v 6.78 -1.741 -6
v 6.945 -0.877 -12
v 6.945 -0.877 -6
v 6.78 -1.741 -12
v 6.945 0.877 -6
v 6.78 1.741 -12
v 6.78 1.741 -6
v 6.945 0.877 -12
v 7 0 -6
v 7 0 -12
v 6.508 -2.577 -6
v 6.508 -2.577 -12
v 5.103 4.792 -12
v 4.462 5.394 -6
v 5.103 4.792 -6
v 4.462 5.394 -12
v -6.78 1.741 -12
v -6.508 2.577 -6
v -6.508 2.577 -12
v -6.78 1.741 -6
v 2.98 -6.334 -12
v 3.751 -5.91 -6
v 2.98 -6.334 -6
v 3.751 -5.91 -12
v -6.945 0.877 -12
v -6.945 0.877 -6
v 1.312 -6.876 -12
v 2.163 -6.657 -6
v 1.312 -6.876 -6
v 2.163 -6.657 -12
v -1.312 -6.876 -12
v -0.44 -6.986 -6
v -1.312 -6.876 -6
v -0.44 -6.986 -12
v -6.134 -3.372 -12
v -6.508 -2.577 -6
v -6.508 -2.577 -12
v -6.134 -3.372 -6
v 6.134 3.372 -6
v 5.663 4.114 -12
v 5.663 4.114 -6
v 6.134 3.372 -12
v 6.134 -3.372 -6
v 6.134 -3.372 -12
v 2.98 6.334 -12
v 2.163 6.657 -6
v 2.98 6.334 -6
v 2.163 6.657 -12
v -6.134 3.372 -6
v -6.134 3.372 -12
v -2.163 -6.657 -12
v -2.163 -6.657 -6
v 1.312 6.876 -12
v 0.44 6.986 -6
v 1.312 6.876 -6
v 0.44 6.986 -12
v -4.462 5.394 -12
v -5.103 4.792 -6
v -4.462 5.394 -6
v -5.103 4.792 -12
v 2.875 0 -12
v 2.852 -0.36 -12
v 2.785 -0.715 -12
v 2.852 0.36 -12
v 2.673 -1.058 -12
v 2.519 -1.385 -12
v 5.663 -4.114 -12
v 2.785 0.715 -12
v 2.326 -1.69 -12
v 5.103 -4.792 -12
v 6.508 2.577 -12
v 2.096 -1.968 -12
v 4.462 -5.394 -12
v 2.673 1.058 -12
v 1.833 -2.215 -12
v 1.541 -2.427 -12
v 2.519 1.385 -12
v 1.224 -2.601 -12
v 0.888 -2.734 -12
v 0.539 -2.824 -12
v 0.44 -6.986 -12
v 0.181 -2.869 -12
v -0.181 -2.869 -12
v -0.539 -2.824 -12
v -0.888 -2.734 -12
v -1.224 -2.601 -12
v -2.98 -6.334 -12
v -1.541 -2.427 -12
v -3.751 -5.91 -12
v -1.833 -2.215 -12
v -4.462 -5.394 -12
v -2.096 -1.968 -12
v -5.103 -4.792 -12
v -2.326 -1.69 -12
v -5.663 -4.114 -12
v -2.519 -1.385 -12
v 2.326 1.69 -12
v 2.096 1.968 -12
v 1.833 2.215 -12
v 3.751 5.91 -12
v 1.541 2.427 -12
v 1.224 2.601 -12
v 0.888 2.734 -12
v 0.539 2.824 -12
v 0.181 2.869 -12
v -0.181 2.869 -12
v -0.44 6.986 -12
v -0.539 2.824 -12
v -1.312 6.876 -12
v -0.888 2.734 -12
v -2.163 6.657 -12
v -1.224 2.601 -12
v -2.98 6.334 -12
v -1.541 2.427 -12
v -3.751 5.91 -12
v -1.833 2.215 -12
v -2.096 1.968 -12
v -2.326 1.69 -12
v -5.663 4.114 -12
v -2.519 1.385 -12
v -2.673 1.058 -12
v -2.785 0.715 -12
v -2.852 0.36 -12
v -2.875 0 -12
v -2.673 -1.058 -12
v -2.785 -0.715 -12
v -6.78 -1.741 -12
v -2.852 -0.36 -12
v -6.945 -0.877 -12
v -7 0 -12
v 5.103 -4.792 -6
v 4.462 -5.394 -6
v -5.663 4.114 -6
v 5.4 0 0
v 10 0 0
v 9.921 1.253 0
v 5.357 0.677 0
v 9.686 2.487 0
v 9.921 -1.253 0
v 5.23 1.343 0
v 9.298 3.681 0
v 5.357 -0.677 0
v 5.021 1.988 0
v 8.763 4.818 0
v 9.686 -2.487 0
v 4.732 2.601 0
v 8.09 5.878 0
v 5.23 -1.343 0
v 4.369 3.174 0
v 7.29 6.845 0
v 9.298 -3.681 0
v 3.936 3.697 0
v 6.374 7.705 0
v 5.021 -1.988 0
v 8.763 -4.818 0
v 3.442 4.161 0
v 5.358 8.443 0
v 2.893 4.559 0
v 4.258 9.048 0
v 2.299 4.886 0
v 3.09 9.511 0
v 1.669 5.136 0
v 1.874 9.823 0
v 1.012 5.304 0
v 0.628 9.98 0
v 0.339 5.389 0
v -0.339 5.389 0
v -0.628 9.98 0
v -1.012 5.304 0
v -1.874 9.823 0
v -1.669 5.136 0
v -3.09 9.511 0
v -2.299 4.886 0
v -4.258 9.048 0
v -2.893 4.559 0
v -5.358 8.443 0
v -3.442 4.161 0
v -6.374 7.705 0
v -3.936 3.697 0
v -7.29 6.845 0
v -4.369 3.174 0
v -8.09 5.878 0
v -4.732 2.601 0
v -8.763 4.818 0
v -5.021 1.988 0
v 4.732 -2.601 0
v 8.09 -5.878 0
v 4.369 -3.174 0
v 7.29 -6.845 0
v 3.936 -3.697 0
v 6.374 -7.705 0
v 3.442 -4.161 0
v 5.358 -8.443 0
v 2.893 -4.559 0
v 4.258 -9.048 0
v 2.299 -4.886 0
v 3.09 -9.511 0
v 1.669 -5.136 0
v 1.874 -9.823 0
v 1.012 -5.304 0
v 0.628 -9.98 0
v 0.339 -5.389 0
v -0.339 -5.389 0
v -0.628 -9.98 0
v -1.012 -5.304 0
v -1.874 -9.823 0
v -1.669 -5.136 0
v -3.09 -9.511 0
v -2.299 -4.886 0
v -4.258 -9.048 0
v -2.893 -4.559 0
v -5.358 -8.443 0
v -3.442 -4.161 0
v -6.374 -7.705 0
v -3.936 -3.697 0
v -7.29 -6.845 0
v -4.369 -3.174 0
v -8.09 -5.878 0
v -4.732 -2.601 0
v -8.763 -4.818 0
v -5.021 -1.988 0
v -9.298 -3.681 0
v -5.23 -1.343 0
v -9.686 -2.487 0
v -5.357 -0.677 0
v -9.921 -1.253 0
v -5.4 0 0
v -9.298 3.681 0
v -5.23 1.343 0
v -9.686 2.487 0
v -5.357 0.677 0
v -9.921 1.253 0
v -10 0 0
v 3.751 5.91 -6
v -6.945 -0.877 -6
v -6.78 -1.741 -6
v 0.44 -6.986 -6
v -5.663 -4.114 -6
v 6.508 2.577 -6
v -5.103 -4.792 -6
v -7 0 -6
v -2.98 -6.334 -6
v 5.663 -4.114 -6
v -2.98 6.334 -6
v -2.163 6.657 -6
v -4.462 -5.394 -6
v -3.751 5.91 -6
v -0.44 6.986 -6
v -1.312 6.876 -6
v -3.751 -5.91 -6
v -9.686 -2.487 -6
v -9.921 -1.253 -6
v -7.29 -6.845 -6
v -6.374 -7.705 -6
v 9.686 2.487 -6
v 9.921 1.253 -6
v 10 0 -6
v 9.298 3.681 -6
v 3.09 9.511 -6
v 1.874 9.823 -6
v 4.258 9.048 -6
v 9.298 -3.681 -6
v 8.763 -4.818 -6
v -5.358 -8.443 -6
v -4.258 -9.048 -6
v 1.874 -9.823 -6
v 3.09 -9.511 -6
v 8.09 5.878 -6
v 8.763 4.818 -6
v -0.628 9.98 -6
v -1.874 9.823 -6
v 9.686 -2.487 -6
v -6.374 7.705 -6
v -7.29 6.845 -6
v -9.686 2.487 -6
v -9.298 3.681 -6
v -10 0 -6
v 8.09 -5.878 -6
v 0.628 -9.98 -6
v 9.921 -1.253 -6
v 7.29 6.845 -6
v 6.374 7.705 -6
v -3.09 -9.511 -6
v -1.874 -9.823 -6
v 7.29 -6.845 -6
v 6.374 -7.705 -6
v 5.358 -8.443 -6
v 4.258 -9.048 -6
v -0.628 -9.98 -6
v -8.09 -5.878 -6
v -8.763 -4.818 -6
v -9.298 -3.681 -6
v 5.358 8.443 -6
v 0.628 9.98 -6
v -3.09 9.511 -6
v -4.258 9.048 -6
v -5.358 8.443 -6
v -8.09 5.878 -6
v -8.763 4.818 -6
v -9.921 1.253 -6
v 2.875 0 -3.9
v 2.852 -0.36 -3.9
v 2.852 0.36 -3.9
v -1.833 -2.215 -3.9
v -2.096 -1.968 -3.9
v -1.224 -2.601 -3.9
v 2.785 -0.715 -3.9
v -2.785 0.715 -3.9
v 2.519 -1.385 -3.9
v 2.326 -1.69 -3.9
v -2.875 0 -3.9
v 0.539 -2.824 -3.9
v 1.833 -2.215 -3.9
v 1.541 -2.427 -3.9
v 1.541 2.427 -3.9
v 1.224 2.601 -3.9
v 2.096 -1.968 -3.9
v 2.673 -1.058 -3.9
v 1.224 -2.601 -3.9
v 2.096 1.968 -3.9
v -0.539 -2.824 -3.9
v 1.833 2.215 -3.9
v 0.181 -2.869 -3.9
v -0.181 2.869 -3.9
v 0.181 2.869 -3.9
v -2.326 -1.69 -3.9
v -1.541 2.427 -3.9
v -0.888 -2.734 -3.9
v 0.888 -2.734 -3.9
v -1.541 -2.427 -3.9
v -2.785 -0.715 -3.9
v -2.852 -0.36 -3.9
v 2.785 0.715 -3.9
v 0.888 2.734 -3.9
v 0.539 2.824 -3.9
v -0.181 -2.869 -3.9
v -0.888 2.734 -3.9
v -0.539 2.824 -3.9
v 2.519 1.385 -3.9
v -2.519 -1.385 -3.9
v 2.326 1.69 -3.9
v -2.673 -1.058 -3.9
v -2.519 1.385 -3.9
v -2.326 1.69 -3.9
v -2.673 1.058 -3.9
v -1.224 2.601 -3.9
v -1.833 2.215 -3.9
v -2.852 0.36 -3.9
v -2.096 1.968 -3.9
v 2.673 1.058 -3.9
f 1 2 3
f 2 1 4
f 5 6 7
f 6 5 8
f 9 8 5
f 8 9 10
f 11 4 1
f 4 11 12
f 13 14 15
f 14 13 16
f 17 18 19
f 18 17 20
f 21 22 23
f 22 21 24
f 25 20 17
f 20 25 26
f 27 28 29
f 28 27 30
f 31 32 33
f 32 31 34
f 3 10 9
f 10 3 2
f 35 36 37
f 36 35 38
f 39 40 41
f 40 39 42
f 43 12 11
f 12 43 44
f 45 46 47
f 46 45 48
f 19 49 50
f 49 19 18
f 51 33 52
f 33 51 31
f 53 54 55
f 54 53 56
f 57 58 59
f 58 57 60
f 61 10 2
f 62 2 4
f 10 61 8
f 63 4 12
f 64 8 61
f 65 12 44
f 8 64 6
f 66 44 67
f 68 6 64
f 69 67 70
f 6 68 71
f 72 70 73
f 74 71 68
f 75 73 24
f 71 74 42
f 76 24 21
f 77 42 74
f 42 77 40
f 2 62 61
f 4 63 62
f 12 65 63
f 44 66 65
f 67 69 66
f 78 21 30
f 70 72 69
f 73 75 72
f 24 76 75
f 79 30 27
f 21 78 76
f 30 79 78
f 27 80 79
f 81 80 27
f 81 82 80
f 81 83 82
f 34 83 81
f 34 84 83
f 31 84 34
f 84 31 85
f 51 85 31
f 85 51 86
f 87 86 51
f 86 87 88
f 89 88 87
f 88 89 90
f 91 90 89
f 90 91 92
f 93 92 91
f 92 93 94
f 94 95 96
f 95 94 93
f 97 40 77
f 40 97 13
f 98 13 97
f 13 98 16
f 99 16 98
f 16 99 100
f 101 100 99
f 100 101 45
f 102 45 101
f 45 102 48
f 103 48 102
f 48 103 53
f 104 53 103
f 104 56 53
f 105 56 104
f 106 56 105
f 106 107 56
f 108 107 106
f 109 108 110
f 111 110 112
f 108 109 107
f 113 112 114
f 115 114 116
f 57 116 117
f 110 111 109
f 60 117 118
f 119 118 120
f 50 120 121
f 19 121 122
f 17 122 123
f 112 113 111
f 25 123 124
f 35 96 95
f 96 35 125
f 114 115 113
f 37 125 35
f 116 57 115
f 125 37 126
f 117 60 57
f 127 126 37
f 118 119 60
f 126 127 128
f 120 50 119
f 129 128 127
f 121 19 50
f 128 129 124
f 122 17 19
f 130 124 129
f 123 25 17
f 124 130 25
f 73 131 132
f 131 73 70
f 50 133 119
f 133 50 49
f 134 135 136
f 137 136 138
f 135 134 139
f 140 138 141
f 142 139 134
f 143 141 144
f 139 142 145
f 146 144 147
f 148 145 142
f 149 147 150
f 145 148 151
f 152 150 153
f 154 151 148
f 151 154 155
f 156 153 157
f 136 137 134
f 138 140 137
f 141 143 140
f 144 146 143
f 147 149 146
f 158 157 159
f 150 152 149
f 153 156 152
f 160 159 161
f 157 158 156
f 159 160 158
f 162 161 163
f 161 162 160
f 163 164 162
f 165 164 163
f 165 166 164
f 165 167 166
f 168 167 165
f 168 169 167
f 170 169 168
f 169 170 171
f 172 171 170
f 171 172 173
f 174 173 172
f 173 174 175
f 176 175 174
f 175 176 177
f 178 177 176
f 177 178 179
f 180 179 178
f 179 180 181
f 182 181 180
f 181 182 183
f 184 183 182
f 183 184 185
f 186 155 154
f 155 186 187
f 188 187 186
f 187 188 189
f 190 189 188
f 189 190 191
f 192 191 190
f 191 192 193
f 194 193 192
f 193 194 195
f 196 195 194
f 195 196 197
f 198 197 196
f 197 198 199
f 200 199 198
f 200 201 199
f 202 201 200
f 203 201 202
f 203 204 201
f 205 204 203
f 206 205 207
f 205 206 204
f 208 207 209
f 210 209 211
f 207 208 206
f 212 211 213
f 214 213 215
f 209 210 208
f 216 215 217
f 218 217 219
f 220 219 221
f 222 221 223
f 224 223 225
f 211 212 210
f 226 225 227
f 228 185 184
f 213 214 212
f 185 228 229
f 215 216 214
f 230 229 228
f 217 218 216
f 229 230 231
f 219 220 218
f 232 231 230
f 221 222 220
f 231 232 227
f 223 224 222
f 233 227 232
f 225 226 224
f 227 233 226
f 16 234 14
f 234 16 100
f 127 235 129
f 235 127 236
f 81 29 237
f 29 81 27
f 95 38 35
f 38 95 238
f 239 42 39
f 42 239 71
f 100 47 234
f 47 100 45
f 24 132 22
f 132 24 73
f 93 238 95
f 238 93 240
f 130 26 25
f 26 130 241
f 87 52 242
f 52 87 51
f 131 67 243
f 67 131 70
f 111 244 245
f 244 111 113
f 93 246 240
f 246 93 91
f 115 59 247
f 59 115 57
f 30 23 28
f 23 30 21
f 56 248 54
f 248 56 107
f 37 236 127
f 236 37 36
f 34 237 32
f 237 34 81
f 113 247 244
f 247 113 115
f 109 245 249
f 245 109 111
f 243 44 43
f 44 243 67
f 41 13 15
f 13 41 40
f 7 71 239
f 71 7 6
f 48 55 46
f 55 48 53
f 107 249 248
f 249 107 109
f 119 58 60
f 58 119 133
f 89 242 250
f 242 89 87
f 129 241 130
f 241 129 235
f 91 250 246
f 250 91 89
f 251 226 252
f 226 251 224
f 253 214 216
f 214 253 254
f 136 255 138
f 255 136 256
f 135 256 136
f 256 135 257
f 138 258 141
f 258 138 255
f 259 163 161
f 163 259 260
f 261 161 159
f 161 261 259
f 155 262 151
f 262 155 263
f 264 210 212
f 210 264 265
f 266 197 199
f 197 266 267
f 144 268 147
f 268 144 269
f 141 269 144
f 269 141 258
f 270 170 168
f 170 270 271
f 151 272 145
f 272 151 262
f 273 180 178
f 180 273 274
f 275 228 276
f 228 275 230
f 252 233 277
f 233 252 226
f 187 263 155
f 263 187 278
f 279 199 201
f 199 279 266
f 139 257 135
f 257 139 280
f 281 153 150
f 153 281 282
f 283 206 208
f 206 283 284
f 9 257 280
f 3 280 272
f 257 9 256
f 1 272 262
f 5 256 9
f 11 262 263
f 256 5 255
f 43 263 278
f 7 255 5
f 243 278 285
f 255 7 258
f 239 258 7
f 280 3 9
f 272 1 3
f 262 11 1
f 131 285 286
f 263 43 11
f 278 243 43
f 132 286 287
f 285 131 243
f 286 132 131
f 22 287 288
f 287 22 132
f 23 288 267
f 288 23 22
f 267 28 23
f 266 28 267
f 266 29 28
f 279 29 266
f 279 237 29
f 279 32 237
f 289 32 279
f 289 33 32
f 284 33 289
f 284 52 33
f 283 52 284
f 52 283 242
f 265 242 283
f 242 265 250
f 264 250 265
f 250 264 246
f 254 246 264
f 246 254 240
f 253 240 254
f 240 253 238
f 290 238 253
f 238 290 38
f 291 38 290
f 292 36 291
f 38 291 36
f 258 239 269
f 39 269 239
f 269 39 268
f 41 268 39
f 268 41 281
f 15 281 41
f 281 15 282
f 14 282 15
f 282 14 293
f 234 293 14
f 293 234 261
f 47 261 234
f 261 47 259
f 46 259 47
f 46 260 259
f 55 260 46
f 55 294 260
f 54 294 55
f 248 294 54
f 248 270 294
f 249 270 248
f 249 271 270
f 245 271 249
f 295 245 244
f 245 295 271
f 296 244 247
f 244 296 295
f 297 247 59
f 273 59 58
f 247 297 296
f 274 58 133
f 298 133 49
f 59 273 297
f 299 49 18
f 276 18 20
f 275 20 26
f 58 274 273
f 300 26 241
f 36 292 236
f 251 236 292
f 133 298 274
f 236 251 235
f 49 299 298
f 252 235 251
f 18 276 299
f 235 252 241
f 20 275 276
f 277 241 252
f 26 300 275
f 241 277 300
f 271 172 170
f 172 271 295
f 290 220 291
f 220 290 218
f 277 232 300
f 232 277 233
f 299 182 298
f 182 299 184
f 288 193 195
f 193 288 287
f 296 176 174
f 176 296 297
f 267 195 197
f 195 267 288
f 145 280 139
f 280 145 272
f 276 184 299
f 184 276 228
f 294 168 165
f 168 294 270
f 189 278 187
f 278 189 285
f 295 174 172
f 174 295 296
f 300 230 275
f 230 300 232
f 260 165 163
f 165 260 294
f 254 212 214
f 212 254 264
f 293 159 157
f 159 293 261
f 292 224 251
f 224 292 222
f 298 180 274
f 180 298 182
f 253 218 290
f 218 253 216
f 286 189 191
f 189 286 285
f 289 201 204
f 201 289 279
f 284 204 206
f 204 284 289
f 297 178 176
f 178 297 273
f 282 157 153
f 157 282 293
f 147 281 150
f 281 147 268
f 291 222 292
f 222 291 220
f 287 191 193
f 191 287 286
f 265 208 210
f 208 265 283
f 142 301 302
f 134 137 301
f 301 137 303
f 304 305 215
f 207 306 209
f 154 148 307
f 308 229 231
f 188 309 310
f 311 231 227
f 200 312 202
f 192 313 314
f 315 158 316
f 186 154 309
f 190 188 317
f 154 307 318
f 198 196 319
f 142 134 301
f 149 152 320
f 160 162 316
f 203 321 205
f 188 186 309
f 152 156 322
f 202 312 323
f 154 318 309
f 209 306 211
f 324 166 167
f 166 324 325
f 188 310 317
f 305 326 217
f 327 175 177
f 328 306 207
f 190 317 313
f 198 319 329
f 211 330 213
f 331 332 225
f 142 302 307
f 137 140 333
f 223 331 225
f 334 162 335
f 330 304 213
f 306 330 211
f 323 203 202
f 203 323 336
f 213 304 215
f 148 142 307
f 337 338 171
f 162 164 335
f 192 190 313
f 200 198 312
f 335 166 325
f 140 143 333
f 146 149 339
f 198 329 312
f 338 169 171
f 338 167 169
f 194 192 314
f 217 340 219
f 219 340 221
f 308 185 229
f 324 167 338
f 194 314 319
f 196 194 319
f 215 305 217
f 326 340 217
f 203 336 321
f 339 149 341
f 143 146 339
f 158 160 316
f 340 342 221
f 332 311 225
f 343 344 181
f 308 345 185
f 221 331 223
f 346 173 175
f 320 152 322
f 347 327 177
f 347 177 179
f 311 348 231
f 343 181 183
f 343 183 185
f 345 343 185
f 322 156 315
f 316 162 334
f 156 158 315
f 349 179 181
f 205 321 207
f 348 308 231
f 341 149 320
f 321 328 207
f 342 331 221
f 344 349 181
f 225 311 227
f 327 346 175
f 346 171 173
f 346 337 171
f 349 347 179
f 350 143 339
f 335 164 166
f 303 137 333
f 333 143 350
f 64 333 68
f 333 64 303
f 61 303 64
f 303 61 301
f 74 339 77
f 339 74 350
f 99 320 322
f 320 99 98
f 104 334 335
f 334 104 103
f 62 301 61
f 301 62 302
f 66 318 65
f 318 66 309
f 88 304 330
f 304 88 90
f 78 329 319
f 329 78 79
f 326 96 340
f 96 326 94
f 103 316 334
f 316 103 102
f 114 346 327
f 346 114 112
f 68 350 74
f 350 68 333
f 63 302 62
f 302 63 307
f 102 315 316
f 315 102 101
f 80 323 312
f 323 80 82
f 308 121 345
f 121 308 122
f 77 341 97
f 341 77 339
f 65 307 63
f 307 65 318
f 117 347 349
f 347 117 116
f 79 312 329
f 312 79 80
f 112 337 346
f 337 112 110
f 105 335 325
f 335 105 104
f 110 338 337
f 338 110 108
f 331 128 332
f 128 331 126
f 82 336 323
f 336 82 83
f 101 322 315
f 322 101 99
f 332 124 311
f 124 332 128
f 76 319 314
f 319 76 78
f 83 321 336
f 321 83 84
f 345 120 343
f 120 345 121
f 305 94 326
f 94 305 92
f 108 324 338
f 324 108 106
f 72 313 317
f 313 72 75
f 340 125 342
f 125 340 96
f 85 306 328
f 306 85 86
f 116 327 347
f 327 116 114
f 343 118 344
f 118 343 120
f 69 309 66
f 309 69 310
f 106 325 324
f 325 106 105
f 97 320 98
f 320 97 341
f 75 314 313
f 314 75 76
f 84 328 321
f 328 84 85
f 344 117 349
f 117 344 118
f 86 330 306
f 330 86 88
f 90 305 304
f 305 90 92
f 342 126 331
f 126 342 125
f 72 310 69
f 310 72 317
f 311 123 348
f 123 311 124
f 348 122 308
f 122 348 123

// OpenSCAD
$fn = 50;


difference() {
	union() {
		translate(v = [0, 0, -12.0000000000]) {
			cylinder(h = 12, r = 7.0000000000);
		}
		translate(v = [0, 0, -6.0000000000]) {
			cylinder(h = 6, r = 10.0000000000);
		}
	}
	union() {
		translate(v = [0, 0, 0]) {
			rotate(a = [0, 0, 0]) {
				difference() {
					union() {
						#translate(v = [0, 0, -12.0000000000]) {
							cylinder(h = 12, r = 2.6000000000);
						}
						#translate(v = [0, 0, -3.9000000000]) {
							cylinder(h = 3.9000000000, r1 = 2.8750000000, r2 = 5.4000000000);
						}
						#translate(v = [0, 0, -12.0000000000]) {
							cylinder(h = 12, r = 2.8750000000);
						}
						#translate(v = [0, 0, -12.0000000000]) {
							cylinder(h = 12, r = 2.6000000000);
						}
					}
					union();
				}
			}
		}
	}
}
